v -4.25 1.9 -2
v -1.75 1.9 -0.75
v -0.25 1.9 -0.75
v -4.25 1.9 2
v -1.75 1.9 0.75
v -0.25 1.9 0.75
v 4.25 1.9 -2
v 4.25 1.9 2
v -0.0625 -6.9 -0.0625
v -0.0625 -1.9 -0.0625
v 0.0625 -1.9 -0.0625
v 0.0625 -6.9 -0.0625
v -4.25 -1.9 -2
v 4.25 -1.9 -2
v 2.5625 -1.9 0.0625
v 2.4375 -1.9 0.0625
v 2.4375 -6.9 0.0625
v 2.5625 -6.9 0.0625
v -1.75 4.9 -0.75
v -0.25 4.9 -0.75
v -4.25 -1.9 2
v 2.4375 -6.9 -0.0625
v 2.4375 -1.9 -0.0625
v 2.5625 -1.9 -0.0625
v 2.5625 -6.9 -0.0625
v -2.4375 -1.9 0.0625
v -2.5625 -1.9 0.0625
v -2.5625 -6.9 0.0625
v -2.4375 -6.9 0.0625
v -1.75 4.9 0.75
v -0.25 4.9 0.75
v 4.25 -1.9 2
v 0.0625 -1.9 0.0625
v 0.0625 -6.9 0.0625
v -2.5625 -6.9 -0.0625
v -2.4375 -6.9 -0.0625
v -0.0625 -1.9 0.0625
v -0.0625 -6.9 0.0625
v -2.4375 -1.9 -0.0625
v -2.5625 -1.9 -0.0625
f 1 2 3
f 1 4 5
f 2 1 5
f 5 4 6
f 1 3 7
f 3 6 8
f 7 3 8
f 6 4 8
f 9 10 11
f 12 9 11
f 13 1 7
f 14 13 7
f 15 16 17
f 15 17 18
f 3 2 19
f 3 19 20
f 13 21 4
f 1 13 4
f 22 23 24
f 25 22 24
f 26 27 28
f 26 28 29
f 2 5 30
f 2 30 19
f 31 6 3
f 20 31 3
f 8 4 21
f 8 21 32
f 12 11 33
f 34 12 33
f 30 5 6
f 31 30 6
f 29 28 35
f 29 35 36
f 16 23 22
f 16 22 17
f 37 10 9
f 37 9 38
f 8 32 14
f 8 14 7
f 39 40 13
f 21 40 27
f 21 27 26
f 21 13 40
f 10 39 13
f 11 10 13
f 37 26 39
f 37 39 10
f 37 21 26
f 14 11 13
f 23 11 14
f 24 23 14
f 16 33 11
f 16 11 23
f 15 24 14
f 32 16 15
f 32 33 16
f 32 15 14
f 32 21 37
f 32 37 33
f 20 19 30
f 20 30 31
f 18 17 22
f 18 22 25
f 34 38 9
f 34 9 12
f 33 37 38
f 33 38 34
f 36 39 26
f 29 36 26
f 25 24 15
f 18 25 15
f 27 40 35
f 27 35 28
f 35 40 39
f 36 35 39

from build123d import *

# Parameters (mm, degrees)
SKETCH1_W           = 8.5
SKETCH1_H           = 3.8
BOSS_EXTRUDE1_DEPTH = 2
SKETCH2_W           = 1.5
SKETCH2_H           = 1.5
BOSS_EXTRUDE2_DEPTH = 3
SKETCH3_W           = 0.125
SKETCH3_H           = 0.125
BOSS_EXTRUDE3_DEPTH = 5


with BuildPart() as part:
    # Sketch1 → Boss-Extrude1 (new, symmetric)
    with BuildSketch(Plane.XY):
        Rectangle(SKETCH1_W, SKETCH1_H)
    extrude(amount=BOSS_EXTRUDE1_DEPTH, both=True)

    # Sketch2 → Boss-Extrude2 (add)
    with BuildSketch(Plane(origin=(0, 1.9, 0), x_dir=(1, 0, 0), z_dir=(0, 1, 0))):
        with Locations((-1, 0)):
            Rectangle(SKETCH2_W, SKETCH2_H)
    extrude(amount=BOSS_EXTRUDE2_DEPTH)

    # Sketch3 → Boss-Extrude3 (add)
    with BuildSketch(Plane.XZ.offset(1.9)):
        Rectangle(SKETCH3_W, SKETCH3_H)
        with Locations((-2.5, 0)):
            Rectangle(SKETCH3_W, SKETCH3_H)
        with Locations((2.5, 0)):
            Rectangle(SKETCH3_W, SKETCH3_H)
    extrude(amount=BOSS_EXTRUDE3_DEPTH)


solid = part.part
